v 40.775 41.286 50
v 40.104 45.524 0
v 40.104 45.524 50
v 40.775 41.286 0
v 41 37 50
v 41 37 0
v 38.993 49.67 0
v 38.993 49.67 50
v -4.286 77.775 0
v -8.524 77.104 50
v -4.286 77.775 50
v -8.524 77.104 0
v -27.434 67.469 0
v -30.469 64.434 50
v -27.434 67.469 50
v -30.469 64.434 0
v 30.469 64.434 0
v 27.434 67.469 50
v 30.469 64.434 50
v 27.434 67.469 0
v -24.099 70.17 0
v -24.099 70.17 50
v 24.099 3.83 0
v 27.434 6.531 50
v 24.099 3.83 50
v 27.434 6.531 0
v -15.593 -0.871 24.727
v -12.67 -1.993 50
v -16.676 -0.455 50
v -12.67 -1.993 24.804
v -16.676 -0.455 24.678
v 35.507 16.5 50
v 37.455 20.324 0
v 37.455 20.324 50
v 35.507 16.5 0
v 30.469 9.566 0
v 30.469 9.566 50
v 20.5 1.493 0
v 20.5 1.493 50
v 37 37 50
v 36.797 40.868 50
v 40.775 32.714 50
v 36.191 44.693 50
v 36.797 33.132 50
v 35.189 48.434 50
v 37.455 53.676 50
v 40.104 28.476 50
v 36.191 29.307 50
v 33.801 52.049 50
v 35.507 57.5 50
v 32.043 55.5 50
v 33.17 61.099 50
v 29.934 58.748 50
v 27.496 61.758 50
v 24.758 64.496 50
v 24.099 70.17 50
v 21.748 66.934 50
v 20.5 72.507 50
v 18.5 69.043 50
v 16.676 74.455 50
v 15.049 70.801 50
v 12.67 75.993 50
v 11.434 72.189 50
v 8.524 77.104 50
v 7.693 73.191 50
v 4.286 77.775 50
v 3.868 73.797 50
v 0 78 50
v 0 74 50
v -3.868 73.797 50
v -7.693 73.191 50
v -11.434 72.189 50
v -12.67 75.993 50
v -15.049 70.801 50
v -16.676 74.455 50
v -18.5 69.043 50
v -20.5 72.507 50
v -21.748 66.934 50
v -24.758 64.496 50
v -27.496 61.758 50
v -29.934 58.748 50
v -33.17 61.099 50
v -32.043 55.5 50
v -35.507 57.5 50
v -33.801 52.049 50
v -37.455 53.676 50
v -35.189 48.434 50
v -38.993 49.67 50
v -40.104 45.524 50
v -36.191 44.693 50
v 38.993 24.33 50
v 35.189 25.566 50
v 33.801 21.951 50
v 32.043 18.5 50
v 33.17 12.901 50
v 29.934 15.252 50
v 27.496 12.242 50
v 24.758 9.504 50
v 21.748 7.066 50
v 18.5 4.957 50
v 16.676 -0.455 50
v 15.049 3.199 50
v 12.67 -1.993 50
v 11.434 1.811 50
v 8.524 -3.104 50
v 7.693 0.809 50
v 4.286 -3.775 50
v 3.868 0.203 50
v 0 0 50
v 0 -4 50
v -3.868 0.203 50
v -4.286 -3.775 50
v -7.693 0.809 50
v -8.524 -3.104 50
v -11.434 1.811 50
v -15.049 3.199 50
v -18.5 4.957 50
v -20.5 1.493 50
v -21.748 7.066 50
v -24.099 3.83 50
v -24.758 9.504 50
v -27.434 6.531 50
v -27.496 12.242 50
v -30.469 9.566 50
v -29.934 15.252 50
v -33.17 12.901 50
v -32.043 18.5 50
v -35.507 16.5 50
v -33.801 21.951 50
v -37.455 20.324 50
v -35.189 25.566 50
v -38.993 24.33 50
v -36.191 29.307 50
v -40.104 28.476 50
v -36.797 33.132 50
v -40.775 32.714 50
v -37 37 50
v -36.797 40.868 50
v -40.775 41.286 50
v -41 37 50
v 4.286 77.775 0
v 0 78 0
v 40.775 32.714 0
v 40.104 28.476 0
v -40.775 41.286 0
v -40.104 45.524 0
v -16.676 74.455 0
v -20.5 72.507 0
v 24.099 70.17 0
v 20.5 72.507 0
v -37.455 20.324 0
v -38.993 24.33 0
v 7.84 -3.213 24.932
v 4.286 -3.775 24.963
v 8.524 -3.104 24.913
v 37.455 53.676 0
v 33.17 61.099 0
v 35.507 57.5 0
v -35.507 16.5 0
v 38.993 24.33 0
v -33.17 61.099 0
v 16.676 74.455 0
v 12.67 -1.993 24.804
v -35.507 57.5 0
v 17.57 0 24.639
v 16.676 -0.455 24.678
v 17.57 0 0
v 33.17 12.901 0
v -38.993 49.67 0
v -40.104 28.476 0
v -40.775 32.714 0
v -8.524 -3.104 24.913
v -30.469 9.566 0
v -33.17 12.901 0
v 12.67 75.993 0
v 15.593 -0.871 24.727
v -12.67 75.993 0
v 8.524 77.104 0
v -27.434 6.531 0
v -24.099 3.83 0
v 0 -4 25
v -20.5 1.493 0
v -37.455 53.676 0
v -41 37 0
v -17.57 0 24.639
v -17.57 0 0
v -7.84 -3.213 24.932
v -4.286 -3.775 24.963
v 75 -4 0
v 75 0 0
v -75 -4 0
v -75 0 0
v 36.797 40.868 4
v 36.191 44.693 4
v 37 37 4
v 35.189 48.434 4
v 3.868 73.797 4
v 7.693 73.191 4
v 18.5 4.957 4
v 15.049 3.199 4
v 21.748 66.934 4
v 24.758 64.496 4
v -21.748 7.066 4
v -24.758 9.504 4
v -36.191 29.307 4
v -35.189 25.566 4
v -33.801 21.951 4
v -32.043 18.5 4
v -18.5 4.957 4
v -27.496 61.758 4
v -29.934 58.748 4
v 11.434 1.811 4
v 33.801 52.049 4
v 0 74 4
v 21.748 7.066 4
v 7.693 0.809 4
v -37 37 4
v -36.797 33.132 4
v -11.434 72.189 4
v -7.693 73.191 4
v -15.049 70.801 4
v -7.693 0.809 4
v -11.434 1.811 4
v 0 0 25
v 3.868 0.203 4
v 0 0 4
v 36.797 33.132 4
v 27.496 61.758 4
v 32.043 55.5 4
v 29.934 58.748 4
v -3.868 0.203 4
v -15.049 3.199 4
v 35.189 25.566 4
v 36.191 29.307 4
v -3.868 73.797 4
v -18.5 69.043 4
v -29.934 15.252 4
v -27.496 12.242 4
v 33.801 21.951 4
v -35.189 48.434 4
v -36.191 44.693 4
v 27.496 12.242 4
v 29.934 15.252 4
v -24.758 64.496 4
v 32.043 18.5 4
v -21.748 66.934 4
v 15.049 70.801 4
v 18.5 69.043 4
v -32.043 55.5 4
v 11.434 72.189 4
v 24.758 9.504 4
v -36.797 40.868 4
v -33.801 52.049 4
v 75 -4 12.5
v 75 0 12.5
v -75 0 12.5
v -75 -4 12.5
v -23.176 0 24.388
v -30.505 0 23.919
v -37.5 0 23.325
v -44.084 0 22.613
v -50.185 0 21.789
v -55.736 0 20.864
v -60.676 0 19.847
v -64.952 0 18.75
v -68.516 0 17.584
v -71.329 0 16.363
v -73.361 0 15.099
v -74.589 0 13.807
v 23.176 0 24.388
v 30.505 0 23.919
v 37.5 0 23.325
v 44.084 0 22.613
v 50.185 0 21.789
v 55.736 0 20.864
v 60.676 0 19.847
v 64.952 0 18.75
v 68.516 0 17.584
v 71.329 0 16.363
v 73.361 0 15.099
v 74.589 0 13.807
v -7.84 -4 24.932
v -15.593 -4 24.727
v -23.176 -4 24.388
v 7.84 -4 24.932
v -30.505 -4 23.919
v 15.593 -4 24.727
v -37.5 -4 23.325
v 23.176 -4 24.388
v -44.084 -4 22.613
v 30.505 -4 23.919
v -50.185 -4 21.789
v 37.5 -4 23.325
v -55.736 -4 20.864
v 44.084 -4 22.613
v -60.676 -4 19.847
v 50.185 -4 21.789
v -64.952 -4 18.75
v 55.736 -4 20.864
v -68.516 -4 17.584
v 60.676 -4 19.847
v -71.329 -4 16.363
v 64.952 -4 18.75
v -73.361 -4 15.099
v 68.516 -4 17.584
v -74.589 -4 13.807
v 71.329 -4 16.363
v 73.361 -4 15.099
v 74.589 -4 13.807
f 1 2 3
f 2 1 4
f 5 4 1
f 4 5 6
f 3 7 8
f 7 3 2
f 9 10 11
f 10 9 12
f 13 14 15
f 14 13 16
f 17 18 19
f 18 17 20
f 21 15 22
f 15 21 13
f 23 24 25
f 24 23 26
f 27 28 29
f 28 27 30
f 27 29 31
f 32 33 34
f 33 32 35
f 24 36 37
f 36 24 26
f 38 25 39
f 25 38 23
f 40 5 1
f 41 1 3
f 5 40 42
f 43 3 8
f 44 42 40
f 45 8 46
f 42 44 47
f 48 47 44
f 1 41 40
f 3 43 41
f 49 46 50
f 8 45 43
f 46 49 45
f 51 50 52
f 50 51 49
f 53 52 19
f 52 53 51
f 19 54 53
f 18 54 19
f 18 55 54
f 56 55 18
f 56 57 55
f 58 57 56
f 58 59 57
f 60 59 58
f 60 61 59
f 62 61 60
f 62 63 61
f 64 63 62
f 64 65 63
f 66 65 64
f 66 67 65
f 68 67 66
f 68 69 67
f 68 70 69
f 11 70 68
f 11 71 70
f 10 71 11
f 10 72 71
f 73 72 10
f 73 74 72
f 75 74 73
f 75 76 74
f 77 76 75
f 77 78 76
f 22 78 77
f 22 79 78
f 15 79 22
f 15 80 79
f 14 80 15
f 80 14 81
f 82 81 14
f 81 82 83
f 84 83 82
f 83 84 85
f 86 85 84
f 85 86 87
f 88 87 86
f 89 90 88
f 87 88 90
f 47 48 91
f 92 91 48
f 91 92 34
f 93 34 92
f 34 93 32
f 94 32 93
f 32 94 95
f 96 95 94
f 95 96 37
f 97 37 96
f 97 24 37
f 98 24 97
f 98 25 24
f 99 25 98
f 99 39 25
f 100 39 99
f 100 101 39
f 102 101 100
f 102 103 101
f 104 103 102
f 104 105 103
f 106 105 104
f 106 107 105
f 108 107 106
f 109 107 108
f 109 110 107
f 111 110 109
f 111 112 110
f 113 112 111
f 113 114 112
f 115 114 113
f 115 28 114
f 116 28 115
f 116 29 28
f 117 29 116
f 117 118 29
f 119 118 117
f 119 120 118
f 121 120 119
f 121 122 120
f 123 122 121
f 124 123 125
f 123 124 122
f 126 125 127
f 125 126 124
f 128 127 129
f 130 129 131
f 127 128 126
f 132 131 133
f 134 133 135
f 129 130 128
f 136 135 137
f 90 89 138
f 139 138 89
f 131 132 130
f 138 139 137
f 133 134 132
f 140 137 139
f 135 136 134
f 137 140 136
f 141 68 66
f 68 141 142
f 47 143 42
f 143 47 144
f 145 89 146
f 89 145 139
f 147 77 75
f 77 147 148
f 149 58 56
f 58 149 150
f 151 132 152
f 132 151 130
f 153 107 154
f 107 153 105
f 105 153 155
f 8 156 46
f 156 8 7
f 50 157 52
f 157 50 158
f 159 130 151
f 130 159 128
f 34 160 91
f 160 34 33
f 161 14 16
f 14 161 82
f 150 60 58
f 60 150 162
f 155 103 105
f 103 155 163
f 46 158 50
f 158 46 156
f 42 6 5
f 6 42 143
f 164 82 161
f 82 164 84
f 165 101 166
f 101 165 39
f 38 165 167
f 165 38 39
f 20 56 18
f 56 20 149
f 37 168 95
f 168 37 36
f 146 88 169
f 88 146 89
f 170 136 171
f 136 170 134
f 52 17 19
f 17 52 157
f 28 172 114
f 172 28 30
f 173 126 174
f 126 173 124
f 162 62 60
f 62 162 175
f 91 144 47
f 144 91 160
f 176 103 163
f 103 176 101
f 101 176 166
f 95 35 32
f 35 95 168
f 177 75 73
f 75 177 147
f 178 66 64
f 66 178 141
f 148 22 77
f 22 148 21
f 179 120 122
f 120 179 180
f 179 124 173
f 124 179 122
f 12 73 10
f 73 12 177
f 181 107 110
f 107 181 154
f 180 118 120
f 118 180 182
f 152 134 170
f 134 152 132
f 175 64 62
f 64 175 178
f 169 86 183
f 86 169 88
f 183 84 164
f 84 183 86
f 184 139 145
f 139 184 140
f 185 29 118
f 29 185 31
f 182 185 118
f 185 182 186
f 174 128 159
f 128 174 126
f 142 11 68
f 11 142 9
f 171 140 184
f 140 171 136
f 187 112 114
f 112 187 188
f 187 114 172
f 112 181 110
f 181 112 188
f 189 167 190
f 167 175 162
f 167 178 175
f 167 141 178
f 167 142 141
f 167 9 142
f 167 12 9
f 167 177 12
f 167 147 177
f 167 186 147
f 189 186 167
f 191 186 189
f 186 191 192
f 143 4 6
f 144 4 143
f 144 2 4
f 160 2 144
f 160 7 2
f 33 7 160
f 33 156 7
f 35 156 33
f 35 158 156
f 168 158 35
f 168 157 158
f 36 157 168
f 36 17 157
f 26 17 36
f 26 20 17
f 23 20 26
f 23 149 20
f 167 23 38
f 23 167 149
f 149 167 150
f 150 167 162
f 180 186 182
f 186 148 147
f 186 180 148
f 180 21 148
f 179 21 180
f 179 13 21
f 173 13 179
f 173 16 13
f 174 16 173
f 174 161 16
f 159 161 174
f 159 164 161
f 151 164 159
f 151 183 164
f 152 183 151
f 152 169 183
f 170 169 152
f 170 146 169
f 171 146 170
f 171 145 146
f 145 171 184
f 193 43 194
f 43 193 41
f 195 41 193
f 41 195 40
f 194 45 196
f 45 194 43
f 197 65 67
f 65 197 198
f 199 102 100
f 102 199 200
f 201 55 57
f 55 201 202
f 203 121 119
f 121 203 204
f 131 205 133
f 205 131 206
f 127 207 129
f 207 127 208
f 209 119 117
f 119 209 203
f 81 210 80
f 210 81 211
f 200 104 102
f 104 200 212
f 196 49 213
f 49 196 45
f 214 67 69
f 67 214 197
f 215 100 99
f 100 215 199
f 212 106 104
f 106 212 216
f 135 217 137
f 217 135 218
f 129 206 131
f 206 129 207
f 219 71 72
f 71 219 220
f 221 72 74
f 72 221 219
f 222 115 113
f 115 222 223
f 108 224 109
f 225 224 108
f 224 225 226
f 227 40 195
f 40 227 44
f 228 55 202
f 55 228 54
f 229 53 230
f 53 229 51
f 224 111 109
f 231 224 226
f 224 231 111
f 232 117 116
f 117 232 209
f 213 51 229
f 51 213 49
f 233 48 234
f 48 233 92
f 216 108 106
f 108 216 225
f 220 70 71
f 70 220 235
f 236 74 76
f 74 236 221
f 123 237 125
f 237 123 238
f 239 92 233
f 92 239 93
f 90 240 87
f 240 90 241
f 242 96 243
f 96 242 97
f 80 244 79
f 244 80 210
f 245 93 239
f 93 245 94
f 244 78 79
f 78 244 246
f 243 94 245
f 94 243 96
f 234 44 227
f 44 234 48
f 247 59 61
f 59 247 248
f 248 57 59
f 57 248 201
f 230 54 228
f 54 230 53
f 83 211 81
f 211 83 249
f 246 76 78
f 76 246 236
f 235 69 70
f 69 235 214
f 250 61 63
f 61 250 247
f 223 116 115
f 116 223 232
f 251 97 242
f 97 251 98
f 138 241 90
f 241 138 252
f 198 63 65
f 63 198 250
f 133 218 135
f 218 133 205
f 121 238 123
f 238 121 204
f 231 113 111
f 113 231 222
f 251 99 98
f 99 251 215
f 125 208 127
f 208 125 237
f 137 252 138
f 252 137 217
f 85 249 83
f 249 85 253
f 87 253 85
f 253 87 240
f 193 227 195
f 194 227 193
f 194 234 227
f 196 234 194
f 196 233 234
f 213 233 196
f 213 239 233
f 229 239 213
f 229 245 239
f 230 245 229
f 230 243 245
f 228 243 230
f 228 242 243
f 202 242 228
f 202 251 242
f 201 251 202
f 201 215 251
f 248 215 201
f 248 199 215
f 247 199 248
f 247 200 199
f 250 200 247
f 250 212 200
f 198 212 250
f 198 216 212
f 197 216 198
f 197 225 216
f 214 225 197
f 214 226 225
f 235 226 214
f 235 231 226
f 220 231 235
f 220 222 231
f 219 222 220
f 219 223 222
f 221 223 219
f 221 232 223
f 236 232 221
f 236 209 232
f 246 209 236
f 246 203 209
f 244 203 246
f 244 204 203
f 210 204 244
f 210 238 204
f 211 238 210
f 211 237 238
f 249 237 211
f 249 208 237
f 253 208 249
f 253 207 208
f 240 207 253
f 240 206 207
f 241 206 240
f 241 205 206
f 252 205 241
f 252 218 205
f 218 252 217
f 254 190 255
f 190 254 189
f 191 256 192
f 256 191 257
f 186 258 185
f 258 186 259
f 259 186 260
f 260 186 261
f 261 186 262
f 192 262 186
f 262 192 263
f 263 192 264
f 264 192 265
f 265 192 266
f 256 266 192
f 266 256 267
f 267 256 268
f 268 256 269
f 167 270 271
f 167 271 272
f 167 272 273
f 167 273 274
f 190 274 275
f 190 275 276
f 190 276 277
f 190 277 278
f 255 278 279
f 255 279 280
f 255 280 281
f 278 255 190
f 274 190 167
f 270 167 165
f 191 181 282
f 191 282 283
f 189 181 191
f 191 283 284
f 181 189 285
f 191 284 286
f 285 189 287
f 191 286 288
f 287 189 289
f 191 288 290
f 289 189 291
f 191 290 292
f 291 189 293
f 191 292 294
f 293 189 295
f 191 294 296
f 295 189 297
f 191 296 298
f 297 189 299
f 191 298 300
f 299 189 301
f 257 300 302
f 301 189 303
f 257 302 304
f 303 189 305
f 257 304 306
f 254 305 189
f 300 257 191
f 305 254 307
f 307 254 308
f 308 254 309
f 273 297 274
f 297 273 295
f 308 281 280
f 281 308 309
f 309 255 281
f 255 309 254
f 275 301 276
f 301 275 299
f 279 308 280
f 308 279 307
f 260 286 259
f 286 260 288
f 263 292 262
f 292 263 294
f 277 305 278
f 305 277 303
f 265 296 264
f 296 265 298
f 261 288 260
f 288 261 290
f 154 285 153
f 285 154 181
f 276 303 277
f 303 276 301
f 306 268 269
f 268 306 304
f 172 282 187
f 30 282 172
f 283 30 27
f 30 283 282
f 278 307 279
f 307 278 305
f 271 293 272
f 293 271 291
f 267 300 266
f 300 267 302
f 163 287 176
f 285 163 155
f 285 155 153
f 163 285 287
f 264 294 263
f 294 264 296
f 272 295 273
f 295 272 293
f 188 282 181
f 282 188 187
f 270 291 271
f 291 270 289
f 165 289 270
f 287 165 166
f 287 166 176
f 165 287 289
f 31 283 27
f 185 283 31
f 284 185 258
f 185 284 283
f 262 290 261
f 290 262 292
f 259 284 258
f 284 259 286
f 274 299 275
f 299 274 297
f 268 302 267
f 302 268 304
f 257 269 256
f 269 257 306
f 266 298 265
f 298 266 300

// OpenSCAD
/********** Bottle Holder for child bed ********/

height = 50;  // Height of the bottle holder
inner_r = 37; // Inner radius of bottle holder, its the radius!!! d = 2 r !!!
material = 4; // material thickness
width = 150;  // Width of the back

$fn = 60;     // Resolution

/********** Processing ************************/

union() {


    difference() {
        
        translate( [ 0.00, inner_r, 0.00 ] ) {
            cylinder( h = height, r = inner_r + material );
        }
        
        translate( [ 0.00, inner_r, material ] ) {
            cylinder( h = height, r = inner_r );
        }
        
    }
    
    
    scale( [ 1, 1, 0.50 ] )
    union() {
    
        translate( [ -(width / 2), -material, 0.00 ] ) {
            cube( [ width, material, height / 2 ]);
        }
        
        translate( [ 0, 0, height / 2 ] ) {
            scale( [width, material, height] ) {
                rotate( [ 90, 0.00, 0.00 ] ) {
                    cylinder( r = 0.5, h = 1 );
                }
            }
        }
        
    }
    
}
